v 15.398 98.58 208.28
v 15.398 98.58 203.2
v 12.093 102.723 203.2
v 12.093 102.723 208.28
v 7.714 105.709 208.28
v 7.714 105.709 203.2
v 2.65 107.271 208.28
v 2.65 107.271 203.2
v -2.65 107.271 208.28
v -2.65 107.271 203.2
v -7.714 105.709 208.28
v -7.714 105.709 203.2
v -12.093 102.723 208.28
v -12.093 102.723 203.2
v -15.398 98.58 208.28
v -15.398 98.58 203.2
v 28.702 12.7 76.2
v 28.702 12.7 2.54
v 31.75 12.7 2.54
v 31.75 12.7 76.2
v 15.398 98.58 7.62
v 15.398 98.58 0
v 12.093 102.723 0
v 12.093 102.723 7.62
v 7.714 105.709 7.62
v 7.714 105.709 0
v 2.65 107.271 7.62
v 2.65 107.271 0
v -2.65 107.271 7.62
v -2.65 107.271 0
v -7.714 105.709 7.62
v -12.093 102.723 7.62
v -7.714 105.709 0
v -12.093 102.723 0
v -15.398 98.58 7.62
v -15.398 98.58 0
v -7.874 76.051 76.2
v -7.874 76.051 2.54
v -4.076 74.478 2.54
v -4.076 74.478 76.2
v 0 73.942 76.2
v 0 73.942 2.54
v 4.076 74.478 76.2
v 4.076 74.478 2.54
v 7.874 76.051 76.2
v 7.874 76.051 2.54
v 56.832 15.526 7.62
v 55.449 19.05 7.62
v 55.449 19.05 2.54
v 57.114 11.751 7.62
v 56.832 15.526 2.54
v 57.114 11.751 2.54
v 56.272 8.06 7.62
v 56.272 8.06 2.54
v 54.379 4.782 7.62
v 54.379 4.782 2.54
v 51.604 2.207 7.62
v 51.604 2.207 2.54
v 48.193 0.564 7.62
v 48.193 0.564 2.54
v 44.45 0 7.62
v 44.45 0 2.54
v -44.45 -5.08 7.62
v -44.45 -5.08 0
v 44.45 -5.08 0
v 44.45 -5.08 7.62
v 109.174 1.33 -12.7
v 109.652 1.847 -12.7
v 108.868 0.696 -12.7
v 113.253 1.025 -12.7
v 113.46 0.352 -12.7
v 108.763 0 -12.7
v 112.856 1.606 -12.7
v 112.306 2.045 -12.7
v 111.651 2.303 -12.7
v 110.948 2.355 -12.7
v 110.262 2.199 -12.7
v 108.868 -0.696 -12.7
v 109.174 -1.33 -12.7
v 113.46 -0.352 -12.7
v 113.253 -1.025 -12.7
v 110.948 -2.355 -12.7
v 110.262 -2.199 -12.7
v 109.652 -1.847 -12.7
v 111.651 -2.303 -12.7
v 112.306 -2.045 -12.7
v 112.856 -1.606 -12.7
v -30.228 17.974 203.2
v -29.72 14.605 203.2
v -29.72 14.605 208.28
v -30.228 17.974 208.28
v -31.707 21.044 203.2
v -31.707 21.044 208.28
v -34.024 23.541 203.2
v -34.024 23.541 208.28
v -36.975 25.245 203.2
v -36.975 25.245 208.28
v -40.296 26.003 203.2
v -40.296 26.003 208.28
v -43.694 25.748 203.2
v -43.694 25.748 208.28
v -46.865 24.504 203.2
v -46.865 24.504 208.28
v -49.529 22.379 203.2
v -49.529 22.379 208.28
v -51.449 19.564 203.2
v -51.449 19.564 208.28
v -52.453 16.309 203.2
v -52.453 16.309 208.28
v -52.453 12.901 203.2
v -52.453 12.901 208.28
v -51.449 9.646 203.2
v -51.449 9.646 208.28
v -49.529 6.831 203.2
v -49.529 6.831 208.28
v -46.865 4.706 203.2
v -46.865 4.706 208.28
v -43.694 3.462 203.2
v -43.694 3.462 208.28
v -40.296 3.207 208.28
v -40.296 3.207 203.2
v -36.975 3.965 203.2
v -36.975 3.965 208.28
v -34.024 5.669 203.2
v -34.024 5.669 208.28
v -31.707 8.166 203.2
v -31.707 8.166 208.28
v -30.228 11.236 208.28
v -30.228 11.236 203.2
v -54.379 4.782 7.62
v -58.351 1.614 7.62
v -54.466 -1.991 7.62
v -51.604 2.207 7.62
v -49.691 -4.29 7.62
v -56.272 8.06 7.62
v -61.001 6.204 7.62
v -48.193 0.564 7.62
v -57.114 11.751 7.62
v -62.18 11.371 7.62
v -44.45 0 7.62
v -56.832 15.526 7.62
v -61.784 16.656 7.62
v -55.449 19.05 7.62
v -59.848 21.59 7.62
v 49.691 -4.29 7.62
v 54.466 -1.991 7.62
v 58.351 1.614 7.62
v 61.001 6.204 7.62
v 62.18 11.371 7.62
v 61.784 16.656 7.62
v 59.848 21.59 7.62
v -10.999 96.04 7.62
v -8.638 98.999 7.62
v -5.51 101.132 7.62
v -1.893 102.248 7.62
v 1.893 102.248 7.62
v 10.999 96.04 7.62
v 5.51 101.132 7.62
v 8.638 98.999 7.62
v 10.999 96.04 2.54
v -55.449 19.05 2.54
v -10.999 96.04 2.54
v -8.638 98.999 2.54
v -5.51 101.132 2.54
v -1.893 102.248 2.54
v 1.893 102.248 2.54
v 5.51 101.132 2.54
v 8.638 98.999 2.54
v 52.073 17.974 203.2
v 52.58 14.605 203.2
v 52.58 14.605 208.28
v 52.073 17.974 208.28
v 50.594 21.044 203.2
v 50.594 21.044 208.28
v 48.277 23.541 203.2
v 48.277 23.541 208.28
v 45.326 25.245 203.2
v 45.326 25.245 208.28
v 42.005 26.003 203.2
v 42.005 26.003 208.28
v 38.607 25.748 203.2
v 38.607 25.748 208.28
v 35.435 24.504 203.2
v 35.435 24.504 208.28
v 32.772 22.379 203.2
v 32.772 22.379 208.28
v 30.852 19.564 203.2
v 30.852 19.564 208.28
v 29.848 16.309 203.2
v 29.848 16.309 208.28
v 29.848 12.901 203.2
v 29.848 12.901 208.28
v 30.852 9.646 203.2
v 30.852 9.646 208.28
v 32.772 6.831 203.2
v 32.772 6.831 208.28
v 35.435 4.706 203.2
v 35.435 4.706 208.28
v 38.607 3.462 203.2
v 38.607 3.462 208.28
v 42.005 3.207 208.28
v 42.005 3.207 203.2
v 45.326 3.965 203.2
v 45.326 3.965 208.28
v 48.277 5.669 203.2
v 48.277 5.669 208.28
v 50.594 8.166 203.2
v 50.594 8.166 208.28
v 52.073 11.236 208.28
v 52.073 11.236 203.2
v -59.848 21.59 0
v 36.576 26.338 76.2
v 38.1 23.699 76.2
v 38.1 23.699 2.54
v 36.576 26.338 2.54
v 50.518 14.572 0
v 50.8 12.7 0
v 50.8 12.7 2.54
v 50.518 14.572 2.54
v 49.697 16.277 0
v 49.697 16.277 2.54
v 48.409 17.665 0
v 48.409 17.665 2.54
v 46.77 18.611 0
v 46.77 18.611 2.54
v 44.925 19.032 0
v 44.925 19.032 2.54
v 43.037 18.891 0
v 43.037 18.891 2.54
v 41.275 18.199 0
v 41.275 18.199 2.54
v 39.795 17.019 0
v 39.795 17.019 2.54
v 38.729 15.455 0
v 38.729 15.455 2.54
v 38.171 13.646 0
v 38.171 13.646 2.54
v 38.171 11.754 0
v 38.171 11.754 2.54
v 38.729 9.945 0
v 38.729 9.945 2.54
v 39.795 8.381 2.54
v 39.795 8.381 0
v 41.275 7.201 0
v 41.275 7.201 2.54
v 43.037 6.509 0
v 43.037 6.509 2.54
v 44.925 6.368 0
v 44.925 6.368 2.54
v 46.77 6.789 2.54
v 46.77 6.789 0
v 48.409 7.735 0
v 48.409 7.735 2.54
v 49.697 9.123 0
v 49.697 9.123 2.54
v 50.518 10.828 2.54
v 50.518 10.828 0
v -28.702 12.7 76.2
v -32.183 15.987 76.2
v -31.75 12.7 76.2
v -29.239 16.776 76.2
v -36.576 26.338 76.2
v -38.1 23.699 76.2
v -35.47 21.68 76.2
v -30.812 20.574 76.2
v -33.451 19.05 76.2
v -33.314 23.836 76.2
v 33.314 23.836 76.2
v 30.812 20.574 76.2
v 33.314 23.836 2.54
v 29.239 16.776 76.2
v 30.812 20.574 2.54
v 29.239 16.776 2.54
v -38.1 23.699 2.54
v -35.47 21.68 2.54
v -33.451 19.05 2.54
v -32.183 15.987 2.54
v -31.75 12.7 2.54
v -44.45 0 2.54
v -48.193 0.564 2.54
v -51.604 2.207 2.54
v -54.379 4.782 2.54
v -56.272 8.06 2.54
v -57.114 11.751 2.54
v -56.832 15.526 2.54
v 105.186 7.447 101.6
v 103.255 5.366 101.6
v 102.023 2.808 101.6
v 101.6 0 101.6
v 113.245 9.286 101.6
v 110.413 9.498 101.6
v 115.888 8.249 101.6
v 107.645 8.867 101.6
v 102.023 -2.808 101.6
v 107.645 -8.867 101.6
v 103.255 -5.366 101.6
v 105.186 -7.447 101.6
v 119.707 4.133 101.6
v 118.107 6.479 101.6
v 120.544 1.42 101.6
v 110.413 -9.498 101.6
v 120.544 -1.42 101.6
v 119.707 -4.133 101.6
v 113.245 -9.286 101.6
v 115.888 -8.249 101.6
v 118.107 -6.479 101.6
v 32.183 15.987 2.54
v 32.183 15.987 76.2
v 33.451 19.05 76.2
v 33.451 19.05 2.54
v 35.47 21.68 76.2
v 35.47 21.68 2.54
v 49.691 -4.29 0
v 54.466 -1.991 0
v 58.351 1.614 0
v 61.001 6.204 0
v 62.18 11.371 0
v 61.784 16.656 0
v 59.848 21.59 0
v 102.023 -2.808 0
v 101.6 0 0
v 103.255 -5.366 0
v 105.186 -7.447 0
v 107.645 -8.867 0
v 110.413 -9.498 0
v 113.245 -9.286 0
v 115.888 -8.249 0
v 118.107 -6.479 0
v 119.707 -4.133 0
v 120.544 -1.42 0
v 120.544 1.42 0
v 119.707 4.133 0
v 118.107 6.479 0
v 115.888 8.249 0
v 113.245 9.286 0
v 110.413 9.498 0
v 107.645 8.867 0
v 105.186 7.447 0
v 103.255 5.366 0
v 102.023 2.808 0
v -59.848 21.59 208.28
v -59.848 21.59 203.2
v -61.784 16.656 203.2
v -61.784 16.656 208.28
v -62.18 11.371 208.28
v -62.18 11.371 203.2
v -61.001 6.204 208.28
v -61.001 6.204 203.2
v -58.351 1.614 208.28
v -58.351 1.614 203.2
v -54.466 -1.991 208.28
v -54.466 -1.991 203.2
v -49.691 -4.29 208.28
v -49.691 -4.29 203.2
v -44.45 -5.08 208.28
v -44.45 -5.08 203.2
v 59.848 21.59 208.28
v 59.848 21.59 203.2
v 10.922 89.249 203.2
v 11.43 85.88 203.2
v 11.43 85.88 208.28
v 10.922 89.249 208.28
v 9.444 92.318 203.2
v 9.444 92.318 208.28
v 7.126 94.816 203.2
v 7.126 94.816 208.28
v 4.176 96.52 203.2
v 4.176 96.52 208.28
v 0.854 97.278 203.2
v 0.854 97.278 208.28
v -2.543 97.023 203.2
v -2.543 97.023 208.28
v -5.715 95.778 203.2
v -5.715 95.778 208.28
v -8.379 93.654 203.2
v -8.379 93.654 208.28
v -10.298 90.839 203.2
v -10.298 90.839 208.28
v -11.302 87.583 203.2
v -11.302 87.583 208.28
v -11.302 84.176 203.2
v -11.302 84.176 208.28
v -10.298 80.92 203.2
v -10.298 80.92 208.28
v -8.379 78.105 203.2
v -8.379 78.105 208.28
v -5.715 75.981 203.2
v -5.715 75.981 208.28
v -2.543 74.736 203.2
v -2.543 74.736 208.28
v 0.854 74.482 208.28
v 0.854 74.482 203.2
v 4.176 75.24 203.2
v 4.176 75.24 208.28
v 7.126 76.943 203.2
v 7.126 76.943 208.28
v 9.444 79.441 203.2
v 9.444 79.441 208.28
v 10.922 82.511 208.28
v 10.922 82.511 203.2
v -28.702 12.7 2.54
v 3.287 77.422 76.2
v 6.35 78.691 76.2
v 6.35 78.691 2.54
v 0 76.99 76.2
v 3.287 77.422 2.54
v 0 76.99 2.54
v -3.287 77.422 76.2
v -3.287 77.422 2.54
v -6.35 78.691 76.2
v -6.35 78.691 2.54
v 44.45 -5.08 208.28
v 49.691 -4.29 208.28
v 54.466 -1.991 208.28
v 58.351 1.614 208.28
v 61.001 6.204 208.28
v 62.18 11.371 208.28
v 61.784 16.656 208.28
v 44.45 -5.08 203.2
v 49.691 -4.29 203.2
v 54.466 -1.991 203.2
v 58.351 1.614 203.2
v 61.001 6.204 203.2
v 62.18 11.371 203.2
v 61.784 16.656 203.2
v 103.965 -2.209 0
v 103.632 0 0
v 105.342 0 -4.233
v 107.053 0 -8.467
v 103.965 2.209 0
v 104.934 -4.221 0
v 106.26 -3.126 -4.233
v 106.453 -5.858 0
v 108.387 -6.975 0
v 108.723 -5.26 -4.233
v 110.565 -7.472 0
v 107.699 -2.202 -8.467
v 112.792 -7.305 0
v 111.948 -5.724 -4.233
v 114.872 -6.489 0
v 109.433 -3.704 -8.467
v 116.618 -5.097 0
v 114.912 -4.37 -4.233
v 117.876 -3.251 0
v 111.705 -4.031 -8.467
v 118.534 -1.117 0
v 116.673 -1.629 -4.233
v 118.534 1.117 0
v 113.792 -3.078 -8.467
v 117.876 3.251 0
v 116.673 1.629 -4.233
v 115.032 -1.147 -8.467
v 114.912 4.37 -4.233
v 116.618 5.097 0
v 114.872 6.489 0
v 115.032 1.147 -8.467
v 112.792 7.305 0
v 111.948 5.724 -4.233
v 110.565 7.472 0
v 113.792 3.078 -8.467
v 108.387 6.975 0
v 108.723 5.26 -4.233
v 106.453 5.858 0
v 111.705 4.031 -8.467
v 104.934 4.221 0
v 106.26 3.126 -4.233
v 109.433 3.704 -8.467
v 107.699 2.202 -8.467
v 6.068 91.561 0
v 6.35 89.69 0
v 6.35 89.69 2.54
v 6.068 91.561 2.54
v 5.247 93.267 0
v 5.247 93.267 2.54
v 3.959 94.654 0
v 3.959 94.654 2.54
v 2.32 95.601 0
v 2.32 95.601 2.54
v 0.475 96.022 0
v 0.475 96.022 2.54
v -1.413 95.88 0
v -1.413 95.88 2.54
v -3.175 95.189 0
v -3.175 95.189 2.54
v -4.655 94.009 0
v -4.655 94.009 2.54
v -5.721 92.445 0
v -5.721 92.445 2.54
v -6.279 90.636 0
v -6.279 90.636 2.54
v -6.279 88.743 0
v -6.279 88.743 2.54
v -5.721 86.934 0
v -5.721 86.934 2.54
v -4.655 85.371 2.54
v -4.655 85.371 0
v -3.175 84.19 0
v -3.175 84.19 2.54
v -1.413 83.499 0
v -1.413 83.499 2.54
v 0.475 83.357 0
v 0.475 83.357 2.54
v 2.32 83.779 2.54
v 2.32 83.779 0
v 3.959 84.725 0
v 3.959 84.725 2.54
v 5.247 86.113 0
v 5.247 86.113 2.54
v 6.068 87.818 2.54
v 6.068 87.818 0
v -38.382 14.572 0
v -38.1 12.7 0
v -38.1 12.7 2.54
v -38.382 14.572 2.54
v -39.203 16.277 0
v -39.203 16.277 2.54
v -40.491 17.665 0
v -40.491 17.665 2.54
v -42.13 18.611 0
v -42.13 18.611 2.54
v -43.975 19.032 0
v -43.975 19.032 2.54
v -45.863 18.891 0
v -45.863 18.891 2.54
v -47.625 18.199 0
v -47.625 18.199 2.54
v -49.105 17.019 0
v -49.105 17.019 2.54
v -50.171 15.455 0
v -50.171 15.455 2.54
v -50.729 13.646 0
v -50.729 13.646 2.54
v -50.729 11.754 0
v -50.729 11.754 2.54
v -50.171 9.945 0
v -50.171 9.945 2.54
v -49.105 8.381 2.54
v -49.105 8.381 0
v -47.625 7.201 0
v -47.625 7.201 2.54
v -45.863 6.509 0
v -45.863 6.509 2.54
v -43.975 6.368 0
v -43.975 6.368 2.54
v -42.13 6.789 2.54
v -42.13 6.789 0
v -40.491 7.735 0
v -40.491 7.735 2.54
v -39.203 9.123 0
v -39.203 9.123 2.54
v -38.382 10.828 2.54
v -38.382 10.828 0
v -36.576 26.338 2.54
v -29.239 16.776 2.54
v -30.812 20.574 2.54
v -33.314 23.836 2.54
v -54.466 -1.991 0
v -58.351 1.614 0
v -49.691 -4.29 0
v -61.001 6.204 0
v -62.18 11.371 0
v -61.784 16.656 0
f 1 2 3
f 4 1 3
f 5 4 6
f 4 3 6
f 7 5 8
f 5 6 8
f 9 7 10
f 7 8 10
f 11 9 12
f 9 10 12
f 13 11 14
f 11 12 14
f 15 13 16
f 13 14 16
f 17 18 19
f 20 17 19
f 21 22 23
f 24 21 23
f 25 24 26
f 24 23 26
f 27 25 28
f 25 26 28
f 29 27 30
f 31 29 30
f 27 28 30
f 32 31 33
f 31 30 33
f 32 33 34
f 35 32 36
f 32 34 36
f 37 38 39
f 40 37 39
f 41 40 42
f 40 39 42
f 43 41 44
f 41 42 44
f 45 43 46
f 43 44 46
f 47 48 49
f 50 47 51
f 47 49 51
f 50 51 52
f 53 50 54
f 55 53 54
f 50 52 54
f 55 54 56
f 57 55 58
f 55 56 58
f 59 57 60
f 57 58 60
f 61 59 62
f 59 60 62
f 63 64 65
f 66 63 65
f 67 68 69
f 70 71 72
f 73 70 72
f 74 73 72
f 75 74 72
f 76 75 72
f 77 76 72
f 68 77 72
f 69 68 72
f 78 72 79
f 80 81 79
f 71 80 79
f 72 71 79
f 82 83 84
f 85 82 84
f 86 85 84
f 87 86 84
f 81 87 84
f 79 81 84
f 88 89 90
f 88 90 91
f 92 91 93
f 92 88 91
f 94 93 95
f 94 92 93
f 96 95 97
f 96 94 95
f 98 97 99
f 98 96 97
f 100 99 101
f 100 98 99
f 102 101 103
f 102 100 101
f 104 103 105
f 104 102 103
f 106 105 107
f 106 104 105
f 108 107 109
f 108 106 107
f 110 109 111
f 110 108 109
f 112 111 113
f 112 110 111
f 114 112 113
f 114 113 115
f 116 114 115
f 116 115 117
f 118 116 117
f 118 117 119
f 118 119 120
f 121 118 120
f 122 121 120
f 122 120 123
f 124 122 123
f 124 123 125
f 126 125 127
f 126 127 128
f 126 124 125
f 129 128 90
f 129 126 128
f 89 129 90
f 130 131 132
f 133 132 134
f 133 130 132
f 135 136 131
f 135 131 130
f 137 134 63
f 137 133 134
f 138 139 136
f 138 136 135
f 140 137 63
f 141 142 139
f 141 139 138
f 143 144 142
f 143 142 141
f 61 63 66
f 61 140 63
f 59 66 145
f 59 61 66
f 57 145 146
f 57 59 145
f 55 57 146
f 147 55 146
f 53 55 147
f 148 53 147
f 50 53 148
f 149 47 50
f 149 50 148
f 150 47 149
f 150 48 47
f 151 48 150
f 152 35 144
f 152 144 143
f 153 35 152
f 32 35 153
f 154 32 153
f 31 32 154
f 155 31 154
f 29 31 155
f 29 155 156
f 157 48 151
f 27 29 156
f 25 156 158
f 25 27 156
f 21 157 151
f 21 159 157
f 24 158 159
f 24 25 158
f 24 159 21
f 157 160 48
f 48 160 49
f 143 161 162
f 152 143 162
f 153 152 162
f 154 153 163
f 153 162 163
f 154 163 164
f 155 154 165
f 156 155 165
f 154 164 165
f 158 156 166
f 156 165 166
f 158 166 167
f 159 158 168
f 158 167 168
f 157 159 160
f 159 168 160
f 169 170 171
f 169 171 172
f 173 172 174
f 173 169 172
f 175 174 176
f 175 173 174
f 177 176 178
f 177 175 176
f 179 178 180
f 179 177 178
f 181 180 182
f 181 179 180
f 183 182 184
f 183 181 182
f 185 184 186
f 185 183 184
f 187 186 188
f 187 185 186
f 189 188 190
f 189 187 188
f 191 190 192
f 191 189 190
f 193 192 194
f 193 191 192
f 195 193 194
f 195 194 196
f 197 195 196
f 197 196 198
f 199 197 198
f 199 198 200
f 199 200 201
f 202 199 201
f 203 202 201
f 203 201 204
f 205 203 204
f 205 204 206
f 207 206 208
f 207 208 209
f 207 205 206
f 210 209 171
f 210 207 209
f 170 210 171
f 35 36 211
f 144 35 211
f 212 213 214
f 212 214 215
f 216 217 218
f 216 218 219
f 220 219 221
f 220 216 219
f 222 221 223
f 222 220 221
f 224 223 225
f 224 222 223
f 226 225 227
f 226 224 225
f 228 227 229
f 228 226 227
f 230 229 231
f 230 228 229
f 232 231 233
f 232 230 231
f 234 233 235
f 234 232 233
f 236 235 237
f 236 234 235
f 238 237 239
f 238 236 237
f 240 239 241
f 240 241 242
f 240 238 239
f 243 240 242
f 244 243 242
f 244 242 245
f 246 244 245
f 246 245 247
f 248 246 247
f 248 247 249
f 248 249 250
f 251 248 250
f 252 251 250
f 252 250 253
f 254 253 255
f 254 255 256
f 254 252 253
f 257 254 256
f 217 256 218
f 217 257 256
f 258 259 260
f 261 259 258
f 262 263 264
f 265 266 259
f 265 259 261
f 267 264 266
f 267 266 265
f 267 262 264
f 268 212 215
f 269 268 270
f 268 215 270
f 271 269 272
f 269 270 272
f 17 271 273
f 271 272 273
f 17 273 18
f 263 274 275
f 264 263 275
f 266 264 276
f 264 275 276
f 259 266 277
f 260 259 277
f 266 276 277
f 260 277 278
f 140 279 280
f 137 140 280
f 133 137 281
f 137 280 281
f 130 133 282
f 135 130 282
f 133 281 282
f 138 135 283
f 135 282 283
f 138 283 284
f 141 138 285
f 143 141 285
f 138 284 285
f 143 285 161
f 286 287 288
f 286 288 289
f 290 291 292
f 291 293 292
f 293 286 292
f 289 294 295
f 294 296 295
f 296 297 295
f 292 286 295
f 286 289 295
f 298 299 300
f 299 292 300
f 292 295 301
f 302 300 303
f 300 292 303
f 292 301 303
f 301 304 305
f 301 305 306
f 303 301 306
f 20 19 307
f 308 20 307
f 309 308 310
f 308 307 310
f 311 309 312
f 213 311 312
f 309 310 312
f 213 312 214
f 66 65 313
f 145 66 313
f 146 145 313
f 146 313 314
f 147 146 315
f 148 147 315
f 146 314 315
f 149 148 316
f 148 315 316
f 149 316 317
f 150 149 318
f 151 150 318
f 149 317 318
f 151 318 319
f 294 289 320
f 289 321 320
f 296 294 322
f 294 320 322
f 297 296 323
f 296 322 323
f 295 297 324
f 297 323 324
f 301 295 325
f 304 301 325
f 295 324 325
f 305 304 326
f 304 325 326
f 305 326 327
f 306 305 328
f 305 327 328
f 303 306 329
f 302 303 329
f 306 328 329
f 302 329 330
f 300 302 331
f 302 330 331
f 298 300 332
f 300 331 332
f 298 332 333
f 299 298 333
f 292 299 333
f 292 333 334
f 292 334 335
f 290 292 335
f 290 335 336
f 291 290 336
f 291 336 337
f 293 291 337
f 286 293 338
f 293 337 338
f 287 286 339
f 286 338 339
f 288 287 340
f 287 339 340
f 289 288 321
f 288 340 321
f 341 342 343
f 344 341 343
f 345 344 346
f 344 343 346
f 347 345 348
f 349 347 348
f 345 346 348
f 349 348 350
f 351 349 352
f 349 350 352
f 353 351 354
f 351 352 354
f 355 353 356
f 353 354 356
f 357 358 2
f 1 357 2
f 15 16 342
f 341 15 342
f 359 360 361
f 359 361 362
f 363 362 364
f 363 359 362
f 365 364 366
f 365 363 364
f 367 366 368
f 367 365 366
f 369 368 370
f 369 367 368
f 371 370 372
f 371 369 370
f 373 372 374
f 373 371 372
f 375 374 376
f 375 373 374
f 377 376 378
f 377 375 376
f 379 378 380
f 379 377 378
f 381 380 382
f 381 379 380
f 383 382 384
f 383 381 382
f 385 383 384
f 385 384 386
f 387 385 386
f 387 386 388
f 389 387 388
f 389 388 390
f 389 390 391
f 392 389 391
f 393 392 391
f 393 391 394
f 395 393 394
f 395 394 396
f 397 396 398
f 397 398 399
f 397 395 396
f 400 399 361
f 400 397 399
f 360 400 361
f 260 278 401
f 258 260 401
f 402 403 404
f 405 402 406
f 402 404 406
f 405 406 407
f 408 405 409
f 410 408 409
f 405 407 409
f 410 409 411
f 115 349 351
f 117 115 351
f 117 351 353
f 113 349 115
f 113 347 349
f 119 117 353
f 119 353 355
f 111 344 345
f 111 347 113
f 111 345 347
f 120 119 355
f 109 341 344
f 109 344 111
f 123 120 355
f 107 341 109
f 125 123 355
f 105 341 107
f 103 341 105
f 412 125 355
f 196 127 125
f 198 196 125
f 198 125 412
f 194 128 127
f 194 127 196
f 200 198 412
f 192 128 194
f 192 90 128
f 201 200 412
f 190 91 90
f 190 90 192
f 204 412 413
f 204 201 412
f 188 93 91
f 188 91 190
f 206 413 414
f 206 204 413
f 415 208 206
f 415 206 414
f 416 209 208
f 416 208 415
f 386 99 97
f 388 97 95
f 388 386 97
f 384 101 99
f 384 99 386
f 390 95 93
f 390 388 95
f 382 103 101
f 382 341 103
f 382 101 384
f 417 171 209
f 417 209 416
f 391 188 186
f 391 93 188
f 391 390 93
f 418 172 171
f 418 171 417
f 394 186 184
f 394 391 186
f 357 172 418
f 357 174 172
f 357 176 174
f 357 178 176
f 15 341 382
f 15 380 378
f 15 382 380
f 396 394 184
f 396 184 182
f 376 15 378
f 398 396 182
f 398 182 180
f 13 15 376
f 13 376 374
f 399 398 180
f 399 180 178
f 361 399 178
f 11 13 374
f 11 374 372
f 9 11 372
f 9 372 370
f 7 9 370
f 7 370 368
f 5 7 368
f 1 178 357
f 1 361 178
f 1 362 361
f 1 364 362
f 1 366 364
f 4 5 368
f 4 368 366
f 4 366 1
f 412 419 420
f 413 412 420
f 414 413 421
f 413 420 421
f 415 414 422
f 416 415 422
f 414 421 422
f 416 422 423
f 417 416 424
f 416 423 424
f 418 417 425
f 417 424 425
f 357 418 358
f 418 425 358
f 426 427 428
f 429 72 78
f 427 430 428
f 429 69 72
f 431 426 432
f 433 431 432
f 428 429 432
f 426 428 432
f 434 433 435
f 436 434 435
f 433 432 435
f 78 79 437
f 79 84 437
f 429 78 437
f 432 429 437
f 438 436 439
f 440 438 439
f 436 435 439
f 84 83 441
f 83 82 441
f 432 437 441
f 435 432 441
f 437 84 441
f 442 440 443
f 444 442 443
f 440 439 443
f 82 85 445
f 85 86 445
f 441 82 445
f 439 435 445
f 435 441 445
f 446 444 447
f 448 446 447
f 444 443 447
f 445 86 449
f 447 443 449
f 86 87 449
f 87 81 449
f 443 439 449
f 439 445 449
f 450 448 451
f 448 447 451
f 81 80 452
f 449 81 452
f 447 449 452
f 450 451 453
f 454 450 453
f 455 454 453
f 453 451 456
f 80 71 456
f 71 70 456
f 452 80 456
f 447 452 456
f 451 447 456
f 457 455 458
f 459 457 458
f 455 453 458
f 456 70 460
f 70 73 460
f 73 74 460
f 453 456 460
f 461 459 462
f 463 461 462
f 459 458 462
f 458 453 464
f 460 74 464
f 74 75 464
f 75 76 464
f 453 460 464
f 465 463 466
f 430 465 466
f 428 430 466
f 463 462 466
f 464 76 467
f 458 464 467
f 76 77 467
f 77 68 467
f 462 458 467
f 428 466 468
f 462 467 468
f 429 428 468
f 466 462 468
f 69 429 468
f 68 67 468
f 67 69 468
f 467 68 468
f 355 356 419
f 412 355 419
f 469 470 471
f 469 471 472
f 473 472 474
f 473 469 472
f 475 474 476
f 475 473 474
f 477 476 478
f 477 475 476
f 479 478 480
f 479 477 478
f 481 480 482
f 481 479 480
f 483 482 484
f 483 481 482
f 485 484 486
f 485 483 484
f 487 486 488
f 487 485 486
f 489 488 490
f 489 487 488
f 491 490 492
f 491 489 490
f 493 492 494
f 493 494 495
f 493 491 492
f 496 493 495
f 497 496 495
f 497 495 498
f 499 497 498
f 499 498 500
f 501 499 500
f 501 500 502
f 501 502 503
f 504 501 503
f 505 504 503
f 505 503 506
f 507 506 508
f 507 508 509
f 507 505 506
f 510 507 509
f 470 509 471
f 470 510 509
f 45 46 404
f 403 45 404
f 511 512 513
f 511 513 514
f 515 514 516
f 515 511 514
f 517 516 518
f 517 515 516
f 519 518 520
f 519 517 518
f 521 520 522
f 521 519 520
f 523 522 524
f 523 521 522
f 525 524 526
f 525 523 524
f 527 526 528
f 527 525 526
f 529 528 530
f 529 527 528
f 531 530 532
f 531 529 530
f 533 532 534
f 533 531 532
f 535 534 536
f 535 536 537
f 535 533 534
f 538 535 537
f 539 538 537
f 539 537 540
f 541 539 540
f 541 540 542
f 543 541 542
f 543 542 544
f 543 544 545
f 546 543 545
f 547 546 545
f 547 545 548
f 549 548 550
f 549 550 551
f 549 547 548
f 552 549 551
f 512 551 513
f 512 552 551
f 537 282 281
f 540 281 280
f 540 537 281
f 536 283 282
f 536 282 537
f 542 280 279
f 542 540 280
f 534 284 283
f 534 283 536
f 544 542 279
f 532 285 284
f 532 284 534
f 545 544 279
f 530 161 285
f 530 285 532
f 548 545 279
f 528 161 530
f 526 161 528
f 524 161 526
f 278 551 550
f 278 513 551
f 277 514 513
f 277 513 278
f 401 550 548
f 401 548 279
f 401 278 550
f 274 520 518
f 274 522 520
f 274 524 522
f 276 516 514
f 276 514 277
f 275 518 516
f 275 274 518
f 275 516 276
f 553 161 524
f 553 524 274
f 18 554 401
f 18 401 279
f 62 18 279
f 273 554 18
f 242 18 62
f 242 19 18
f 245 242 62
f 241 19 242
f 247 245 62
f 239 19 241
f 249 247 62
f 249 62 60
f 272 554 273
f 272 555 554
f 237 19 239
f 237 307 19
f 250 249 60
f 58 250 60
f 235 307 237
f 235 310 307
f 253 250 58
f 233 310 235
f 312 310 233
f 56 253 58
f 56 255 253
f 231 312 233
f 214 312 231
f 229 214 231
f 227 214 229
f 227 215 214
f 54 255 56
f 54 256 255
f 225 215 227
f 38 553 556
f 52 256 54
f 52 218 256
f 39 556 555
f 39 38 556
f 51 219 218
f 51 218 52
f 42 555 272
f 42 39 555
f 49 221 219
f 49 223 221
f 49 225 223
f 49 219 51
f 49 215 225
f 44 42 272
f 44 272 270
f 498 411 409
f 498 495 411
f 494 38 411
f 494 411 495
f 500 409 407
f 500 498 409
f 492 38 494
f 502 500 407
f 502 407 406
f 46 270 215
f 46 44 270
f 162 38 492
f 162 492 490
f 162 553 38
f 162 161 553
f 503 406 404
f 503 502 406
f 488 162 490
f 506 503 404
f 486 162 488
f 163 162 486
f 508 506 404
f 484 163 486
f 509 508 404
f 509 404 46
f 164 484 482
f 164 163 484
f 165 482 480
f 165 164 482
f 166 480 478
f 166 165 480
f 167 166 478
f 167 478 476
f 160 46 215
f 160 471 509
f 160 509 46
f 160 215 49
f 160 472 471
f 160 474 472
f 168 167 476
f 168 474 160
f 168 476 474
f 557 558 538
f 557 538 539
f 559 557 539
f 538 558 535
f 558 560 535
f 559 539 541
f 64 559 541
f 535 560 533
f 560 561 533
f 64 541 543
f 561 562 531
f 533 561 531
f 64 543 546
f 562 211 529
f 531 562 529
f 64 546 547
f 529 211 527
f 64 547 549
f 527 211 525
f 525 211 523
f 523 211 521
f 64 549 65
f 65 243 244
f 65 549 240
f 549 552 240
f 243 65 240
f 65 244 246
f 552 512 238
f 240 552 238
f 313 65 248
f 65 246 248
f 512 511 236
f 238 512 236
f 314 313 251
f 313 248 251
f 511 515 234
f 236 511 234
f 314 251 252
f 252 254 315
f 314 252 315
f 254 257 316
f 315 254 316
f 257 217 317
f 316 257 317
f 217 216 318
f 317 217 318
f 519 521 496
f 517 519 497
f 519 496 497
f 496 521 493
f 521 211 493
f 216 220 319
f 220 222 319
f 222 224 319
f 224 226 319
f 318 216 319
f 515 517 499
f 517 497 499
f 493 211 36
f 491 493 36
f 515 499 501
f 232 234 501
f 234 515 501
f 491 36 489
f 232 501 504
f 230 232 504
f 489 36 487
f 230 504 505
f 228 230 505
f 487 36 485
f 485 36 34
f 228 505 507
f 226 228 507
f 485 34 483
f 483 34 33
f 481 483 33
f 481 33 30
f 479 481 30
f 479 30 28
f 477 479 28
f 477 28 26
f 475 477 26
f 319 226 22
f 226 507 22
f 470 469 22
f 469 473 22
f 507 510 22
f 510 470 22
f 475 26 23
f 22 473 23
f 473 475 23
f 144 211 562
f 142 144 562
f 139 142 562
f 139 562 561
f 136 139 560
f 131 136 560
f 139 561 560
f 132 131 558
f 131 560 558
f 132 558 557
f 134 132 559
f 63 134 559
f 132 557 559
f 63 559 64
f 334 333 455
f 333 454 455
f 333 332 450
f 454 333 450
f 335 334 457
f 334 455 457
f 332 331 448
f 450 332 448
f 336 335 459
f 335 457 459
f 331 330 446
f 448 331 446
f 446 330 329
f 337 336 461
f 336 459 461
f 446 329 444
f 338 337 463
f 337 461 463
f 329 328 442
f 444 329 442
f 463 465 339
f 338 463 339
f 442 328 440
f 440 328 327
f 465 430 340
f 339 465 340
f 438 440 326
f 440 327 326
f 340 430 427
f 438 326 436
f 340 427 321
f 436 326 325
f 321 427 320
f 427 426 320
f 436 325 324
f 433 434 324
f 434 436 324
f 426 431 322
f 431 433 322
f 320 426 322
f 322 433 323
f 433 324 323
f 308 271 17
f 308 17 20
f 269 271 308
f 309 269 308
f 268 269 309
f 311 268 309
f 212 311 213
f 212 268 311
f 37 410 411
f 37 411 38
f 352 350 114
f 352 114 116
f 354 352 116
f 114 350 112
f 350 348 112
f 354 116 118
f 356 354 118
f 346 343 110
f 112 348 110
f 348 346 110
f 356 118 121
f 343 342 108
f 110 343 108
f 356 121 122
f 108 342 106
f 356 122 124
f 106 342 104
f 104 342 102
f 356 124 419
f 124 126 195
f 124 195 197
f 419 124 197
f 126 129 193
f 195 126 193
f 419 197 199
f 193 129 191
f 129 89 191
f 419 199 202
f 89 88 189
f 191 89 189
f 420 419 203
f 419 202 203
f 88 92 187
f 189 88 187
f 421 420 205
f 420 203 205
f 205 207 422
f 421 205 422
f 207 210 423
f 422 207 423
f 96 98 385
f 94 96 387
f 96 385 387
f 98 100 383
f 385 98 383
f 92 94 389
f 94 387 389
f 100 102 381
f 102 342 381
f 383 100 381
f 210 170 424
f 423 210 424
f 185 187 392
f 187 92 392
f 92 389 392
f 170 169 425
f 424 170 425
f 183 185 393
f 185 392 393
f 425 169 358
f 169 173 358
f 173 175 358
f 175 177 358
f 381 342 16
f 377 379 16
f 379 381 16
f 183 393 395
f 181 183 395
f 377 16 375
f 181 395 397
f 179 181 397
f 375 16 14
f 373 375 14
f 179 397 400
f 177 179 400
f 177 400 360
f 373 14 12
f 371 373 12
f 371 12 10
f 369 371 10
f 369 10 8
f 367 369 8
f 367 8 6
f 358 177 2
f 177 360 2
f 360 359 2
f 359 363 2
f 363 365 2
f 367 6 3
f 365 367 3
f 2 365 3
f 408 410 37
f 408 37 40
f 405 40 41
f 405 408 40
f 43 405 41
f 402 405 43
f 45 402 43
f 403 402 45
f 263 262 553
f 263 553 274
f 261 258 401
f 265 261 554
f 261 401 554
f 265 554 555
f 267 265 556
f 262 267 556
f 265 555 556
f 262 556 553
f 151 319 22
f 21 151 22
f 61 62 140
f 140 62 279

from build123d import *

# Parameters (mm, degrees)
F1_DEPTH = 7.62
F2_DEPTH = 76.2
F0_R     = 6.35
F3_DEPTH = 2.54
F7_R     = 11.43
F8_DEPTH = 5.08


with BuildPart() as f1:
    # F0 (on Top) → F1 (new body)
    with BuildSketch(Plane.XY):
        with BuildLine():
            Line((59.8479316793, 21.59), (15.3979316793, 98.5796583964))
            ThreePointArc((15.3979316793, 98.5796583964), (0, 107.4696583964), (-15.3979316793, 98.5796583964))
            Line((-15.3979316793, 98.5796583964), (-59.8479316793, 21.59))
            ThreePointArc((-59.8479316793, 21.59), (-59.8479316793, 3.81), (-44.45, -5.08))
            Line((-44.45, -5.08), (44.45, -5.08))
            ThreePointArc((44.45, -5.08), (59.8479316793, 3.81), (59.8479316793, 21.59))
        make_face()
        with BuildLine():
            Line((-55.4485226281, 19.05), (-10.9985226281, 96.0396583964))
            ThreePointArc((-10.9985226281, 96.0396583964), (0, 102.3896583964), (10.9985226281, 96.0396583964))
            Line((10.9985226281, 96.0396583964), (55.4485226281, 19.05))
            ThreePointArc((55.4485226281, 19.05), (55.4485226281, 6.35), (44.45, 0))
            Line((44.45, 0), (-44.45, 0))
            ThreePointArc((-44.45, 0), (-55.4485226281, 6.35), (-55.4485226281, 19.05))
        make_face(mode=Mode.SUBTRACT)
    extrude(amount=F1_DEPTH)



with BuildPart() as f2:
    # F0 (on Top) → F2 (new body)
    with BuildSketch(Plane.XY):
        with BuildLine():
            ThreePointArc((6.35, 78.6911357684), (0, 76.9896583964), (-6.35, 78.6911357684))
            Line((-6.35, 78.6911357684), (-7.874, 76.0514903376))
            ThreePointArc((-7.874, 76.0514903376), (0, 73.9416583964), (7.874, 76.0514903376))
            Line((7.874, 76.0514903376), (6.35, 78.6911357684))
        make_face()
    extrude(amount=F2_DEPTH)


with BuildPart() as f2b:
    # F0 (on Top) → F2, piece 2 (new body)
    with BuildSketch(Plane.XY):
        with BuildLine():
            Line((-36.576, 26.3381680588), (-38.1, 23.6985226281))
            ThreePointArc((-38.1, 23.6985226281), (-33.4514773719, 19.05), (-31.75, 12.7))
            Line((-31.75, 12.7), (-28.702, 12.7))
            ThreePointArc((-28.702, 12.7), (-30.8118319412, 20.574), (-36.576, 26.3381680588))
        make_face()
    extrude(amount=F2_DEPTH)


with BuildPart() as f2c:
    # F0 (on Top) → F2, piece 3 (new body)
    with BuildSketch(Plane.XY):
        with BuildLine():
            ThreePointArc((31.75, 12.7), (33.4514773719, 19.05), (38.1, 23.6985226281))
            Line((38.1, 23.6985226281), (36.576, 26.3381680588))
            ThreePointArc((36.576, 26.3381680588), (30.8118319412, 20.574), (28.702, 12.7))
            Line((28.702, 12.7), (31.75, 12.7))
        make_face()
    extrude(amount=F2_DEPTH)


with BuildPart() as f1_1:
    add(f1.part)

    add(f2.part)  # F3 merges F2

    add(f2b.part)  # F3 merges F2b

    add(f2c.part)  # F3 merges F2c
    # F0 (on Top) → F3 (join)
    with BuildSketch(Plane.XY):
        with BuildLine():
            ThreePointArc((10.9985226281, 96.0396583964), (0, 102.3896583964), (-10.9985226281, 96.0396583964))
            Line((-10.9985226281, 96.0396583964), (-55.4485226281, 19.05))
            ThreePointArc((-55.4485226281, 19.05), (-55.4485226281, 6.35), (-44.45, 0))
            Line((-44.45, 0), (44.45, 0))
            ThreePointArc((44.45, 0), (55.4485226281, 6.35), (55.4485226281, 19.05))
            Line((55.4485226281, 19.05), (10.9985226281, 96.0396583964))
        make_face()
        with Locations((-44.45, 12.7)):
            Circle(F0_R, mode=Mode.SUBTRACT)
        with BuildLine():
            ThreePointArc((-31.75, 12.7), (-33.4514773719, 19.05), (-38.1, 23.6985226281))
            Line((-38.1, 23.6985226281), (-36.576, 26.3381680588))
            ThreePointArc((-36.576, 26.3381680588), (-30.8118319412, 20.574), (-28.702, 12.7))
            Line((-28.702, 12.7), (-31.75, 12.7))
        make_face(mode=Mode.SUBTRACT)
        with Locations((44.45, 12.7)):
            Circle(F0_R, mode=Mode.SUBTRACT)
        with BuildLine():
            Line((36.576, 26.3381680588), (38.1, 23.6985226281))
            ThreePointArc((38.1, 23.6985226281), (33.4514773719, 19.05), (31.75, 12.7))
            Line((31.75, 12.7), (28.702, 12.7))
            ThreePointArc((28.702, 12.7), (30.8118319412, 20.574), (36.576, 26.3381680588))
        make_face(mode=Mode.SUBTRACT)
        with BuildLine():
            Line((-7.874, 76.0514903376), (-6.35, 78.6911357684))
            ThreePointArc((-6.35, 78.6911357684), (0, 76.9896583964), (6.35, 78.6911357684))
            Line((6.35, 78.6911357684), (7.874, 76.0514903376))
            ThreePointArc((7.874, 76.0514903376), (0, 73.9416583964), (-7.874, 76.0514903376))
        make_face(mode=Mode.SUBTRACT)
        with Locations((0, 89.6896583964)):
            Circle(F0_R, mode=Mode.SUBTRACT)
    extrude(amount=F3_DEPTH)


with BuildPart() as f5:
    # F4 (on Front) → F5 (revolve)
    with BuildSketch(Plane.XZ):
        Polygon((101.6, 101.6), (101.6, 0), (103.632, 0), (108.7631330681, -12.7), (111.125, -12.7), (111.125, 101.6), align=None)
    revolve(axis=Axis((111.125, 0, 36.0349300282), (0, 0, 1)))


with BuildPart() as f8:
    # F7 (on offset) → F8 (new body)
    with BuildSketch(Plane.XY.offset(203.2)):
        with BuildLine():
            ThreePointArc((15.3979316793, 98.5796583964), (0, 107.4696583964), (-15.3979316793, 98.5796583964))
            Line((-15.3979316793, 98.5796583964), (-59.8479316793, 21.59))
            ThreePointArc((-59.8479316793, 21.59), (-59.8479316793, 3.81), (-44.45, -5.08))
            Line((-44.45, -5.08), (44.45, -5.08))
            ThreePointArc((44.45, -5.08), (59.8479316793, 3.81), (59.8479316793, 21.59))
            Line((59.8479316793, 21.59), (15.3979316793, 98.5796583964))
        make_face()
        with Locations((-41.1504432116, 14.605)):
            Circle(F7_R, mode=Mode.SUBTRACT)
        with Locations((41.1504432116, 14.605)):
            Circle(F7_R, mode=Mode.SUBTRACT)
        with Locations((0, 85.8796583964)):
            Circle(F7_R, mode=Mode.SUBTRACT)
    extrude(amount=F8_DEPTH)


solid = Compound([f1_1.part, f5.part, f8.part])
